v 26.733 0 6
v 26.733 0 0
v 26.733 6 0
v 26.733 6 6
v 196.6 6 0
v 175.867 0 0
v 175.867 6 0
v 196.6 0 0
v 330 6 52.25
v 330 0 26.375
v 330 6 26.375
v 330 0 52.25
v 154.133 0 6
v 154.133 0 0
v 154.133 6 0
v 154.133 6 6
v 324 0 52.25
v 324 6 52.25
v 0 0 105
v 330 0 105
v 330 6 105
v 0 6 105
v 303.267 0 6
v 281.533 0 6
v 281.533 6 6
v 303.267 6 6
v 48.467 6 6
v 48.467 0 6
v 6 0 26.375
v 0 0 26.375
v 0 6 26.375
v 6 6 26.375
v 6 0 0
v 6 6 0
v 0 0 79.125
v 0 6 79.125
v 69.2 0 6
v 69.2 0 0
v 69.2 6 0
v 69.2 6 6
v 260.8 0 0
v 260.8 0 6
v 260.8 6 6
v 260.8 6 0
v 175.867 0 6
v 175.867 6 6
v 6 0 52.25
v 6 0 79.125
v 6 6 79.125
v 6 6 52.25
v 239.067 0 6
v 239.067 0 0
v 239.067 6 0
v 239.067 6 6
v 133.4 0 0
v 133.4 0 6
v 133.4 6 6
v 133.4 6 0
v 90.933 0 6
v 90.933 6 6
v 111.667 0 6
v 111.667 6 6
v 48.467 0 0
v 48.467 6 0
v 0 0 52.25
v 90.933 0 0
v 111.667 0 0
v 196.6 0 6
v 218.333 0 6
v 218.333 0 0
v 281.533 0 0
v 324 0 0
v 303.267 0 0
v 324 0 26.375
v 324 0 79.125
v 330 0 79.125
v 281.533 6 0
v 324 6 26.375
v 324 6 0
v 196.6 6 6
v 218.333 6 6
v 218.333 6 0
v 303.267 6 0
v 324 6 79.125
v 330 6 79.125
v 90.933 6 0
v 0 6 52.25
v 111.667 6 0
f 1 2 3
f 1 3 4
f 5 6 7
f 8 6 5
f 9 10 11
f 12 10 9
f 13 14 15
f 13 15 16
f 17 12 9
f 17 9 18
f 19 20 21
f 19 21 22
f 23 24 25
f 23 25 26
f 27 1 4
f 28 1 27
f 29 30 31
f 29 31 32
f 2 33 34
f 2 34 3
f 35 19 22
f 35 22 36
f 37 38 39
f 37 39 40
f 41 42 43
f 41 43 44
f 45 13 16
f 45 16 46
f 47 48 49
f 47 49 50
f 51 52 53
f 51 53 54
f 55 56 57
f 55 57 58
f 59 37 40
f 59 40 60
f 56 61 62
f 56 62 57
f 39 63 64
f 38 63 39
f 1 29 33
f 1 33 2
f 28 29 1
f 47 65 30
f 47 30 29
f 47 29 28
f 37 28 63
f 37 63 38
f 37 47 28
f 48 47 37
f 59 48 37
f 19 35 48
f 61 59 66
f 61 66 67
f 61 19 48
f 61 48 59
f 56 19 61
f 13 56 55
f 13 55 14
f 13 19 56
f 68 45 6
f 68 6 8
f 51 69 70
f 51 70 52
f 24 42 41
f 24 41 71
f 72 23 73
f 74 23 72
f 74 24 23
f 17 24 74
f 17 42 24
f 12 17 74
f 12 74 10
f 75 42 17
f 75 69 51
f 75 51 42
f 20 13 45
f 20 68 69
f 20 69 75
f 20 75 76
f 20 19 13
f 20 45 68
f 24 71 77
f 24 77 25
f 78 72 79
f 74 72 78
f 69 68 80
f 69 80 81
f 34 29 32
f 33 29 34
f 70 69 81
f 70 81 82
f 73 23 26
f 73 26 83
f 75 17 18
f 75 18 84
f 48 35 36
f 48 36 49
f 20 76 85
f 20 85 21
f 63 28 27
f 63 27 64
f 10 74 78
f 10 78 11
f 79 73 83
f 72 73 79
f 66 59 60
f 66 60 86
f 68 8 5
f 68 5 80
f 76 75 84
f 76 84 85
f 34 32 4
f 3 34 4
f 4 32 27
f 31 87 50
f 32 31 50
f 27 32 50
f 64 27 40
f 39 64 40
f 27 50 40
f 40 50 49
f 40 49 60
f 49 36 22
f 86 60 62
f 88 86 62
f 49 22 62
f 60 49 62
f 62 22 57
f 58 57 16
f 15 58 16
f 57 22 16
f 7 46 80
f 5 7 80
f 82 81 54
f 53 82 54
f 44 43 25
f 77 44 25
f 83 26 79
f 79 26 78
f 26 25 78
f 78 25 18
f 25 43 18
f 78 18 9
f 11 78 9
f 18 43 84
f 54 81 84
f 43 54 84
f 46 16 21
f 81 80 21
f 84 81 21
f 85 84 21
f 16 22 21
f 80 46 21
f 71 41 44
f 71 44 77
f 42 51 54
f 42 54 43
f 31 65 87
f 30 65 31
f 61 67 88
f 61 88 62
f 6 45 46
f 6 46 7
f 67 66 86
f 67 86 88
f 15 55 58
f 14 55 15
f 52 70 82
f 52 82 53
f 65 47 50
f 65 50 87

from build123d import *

# Parameters (mm, degrees)
BOSS_EXTRUDE1_DEPTH = 6


with BuildPart() as part:
    # Sketch1 → Boss-Extrude1 (new body)
    with BuildSketch(Plane.XZ):
        Polygon((48.466666667, 6), (48.466666667, 0), (69.2, 0), (69.2, 6), (90.933333333, 6), (90.933333333, 0), (111.666666667, 0), (111.666666667, 6), (133.4, 6), (133.4, 0), (154.133333333, 0), (154.133333333, 6), (175.866666667, 6), (175.866666667, 0), (196.6, 0), (196.6, 6), (218.333333333, 6), (218.333333333, 0), (239.066666667, 0), (239.066666667, 6), (260.8, 6), (260.8, 0), (281.533333333, 0), (281.533333333, 6), (303.266666667, 6), (303.266666667, 0), (324, 0), (324, 26.375), (330, 26.375), (330, 52.25), (324, 52.25), (324, 79.125), (330, 79.125), (330, 105), (0, 105), (0, 79.125), (6, 79.125), (6, 52.25), (0, 52.25), (0, 26.375), (6, 26.375), (6, 0), (26.733333333, 0), (26.733333333, 6), align=None)
    extrude(amount=-BOSS_EXTRUDE1_DEPTH)


solid = part.part
